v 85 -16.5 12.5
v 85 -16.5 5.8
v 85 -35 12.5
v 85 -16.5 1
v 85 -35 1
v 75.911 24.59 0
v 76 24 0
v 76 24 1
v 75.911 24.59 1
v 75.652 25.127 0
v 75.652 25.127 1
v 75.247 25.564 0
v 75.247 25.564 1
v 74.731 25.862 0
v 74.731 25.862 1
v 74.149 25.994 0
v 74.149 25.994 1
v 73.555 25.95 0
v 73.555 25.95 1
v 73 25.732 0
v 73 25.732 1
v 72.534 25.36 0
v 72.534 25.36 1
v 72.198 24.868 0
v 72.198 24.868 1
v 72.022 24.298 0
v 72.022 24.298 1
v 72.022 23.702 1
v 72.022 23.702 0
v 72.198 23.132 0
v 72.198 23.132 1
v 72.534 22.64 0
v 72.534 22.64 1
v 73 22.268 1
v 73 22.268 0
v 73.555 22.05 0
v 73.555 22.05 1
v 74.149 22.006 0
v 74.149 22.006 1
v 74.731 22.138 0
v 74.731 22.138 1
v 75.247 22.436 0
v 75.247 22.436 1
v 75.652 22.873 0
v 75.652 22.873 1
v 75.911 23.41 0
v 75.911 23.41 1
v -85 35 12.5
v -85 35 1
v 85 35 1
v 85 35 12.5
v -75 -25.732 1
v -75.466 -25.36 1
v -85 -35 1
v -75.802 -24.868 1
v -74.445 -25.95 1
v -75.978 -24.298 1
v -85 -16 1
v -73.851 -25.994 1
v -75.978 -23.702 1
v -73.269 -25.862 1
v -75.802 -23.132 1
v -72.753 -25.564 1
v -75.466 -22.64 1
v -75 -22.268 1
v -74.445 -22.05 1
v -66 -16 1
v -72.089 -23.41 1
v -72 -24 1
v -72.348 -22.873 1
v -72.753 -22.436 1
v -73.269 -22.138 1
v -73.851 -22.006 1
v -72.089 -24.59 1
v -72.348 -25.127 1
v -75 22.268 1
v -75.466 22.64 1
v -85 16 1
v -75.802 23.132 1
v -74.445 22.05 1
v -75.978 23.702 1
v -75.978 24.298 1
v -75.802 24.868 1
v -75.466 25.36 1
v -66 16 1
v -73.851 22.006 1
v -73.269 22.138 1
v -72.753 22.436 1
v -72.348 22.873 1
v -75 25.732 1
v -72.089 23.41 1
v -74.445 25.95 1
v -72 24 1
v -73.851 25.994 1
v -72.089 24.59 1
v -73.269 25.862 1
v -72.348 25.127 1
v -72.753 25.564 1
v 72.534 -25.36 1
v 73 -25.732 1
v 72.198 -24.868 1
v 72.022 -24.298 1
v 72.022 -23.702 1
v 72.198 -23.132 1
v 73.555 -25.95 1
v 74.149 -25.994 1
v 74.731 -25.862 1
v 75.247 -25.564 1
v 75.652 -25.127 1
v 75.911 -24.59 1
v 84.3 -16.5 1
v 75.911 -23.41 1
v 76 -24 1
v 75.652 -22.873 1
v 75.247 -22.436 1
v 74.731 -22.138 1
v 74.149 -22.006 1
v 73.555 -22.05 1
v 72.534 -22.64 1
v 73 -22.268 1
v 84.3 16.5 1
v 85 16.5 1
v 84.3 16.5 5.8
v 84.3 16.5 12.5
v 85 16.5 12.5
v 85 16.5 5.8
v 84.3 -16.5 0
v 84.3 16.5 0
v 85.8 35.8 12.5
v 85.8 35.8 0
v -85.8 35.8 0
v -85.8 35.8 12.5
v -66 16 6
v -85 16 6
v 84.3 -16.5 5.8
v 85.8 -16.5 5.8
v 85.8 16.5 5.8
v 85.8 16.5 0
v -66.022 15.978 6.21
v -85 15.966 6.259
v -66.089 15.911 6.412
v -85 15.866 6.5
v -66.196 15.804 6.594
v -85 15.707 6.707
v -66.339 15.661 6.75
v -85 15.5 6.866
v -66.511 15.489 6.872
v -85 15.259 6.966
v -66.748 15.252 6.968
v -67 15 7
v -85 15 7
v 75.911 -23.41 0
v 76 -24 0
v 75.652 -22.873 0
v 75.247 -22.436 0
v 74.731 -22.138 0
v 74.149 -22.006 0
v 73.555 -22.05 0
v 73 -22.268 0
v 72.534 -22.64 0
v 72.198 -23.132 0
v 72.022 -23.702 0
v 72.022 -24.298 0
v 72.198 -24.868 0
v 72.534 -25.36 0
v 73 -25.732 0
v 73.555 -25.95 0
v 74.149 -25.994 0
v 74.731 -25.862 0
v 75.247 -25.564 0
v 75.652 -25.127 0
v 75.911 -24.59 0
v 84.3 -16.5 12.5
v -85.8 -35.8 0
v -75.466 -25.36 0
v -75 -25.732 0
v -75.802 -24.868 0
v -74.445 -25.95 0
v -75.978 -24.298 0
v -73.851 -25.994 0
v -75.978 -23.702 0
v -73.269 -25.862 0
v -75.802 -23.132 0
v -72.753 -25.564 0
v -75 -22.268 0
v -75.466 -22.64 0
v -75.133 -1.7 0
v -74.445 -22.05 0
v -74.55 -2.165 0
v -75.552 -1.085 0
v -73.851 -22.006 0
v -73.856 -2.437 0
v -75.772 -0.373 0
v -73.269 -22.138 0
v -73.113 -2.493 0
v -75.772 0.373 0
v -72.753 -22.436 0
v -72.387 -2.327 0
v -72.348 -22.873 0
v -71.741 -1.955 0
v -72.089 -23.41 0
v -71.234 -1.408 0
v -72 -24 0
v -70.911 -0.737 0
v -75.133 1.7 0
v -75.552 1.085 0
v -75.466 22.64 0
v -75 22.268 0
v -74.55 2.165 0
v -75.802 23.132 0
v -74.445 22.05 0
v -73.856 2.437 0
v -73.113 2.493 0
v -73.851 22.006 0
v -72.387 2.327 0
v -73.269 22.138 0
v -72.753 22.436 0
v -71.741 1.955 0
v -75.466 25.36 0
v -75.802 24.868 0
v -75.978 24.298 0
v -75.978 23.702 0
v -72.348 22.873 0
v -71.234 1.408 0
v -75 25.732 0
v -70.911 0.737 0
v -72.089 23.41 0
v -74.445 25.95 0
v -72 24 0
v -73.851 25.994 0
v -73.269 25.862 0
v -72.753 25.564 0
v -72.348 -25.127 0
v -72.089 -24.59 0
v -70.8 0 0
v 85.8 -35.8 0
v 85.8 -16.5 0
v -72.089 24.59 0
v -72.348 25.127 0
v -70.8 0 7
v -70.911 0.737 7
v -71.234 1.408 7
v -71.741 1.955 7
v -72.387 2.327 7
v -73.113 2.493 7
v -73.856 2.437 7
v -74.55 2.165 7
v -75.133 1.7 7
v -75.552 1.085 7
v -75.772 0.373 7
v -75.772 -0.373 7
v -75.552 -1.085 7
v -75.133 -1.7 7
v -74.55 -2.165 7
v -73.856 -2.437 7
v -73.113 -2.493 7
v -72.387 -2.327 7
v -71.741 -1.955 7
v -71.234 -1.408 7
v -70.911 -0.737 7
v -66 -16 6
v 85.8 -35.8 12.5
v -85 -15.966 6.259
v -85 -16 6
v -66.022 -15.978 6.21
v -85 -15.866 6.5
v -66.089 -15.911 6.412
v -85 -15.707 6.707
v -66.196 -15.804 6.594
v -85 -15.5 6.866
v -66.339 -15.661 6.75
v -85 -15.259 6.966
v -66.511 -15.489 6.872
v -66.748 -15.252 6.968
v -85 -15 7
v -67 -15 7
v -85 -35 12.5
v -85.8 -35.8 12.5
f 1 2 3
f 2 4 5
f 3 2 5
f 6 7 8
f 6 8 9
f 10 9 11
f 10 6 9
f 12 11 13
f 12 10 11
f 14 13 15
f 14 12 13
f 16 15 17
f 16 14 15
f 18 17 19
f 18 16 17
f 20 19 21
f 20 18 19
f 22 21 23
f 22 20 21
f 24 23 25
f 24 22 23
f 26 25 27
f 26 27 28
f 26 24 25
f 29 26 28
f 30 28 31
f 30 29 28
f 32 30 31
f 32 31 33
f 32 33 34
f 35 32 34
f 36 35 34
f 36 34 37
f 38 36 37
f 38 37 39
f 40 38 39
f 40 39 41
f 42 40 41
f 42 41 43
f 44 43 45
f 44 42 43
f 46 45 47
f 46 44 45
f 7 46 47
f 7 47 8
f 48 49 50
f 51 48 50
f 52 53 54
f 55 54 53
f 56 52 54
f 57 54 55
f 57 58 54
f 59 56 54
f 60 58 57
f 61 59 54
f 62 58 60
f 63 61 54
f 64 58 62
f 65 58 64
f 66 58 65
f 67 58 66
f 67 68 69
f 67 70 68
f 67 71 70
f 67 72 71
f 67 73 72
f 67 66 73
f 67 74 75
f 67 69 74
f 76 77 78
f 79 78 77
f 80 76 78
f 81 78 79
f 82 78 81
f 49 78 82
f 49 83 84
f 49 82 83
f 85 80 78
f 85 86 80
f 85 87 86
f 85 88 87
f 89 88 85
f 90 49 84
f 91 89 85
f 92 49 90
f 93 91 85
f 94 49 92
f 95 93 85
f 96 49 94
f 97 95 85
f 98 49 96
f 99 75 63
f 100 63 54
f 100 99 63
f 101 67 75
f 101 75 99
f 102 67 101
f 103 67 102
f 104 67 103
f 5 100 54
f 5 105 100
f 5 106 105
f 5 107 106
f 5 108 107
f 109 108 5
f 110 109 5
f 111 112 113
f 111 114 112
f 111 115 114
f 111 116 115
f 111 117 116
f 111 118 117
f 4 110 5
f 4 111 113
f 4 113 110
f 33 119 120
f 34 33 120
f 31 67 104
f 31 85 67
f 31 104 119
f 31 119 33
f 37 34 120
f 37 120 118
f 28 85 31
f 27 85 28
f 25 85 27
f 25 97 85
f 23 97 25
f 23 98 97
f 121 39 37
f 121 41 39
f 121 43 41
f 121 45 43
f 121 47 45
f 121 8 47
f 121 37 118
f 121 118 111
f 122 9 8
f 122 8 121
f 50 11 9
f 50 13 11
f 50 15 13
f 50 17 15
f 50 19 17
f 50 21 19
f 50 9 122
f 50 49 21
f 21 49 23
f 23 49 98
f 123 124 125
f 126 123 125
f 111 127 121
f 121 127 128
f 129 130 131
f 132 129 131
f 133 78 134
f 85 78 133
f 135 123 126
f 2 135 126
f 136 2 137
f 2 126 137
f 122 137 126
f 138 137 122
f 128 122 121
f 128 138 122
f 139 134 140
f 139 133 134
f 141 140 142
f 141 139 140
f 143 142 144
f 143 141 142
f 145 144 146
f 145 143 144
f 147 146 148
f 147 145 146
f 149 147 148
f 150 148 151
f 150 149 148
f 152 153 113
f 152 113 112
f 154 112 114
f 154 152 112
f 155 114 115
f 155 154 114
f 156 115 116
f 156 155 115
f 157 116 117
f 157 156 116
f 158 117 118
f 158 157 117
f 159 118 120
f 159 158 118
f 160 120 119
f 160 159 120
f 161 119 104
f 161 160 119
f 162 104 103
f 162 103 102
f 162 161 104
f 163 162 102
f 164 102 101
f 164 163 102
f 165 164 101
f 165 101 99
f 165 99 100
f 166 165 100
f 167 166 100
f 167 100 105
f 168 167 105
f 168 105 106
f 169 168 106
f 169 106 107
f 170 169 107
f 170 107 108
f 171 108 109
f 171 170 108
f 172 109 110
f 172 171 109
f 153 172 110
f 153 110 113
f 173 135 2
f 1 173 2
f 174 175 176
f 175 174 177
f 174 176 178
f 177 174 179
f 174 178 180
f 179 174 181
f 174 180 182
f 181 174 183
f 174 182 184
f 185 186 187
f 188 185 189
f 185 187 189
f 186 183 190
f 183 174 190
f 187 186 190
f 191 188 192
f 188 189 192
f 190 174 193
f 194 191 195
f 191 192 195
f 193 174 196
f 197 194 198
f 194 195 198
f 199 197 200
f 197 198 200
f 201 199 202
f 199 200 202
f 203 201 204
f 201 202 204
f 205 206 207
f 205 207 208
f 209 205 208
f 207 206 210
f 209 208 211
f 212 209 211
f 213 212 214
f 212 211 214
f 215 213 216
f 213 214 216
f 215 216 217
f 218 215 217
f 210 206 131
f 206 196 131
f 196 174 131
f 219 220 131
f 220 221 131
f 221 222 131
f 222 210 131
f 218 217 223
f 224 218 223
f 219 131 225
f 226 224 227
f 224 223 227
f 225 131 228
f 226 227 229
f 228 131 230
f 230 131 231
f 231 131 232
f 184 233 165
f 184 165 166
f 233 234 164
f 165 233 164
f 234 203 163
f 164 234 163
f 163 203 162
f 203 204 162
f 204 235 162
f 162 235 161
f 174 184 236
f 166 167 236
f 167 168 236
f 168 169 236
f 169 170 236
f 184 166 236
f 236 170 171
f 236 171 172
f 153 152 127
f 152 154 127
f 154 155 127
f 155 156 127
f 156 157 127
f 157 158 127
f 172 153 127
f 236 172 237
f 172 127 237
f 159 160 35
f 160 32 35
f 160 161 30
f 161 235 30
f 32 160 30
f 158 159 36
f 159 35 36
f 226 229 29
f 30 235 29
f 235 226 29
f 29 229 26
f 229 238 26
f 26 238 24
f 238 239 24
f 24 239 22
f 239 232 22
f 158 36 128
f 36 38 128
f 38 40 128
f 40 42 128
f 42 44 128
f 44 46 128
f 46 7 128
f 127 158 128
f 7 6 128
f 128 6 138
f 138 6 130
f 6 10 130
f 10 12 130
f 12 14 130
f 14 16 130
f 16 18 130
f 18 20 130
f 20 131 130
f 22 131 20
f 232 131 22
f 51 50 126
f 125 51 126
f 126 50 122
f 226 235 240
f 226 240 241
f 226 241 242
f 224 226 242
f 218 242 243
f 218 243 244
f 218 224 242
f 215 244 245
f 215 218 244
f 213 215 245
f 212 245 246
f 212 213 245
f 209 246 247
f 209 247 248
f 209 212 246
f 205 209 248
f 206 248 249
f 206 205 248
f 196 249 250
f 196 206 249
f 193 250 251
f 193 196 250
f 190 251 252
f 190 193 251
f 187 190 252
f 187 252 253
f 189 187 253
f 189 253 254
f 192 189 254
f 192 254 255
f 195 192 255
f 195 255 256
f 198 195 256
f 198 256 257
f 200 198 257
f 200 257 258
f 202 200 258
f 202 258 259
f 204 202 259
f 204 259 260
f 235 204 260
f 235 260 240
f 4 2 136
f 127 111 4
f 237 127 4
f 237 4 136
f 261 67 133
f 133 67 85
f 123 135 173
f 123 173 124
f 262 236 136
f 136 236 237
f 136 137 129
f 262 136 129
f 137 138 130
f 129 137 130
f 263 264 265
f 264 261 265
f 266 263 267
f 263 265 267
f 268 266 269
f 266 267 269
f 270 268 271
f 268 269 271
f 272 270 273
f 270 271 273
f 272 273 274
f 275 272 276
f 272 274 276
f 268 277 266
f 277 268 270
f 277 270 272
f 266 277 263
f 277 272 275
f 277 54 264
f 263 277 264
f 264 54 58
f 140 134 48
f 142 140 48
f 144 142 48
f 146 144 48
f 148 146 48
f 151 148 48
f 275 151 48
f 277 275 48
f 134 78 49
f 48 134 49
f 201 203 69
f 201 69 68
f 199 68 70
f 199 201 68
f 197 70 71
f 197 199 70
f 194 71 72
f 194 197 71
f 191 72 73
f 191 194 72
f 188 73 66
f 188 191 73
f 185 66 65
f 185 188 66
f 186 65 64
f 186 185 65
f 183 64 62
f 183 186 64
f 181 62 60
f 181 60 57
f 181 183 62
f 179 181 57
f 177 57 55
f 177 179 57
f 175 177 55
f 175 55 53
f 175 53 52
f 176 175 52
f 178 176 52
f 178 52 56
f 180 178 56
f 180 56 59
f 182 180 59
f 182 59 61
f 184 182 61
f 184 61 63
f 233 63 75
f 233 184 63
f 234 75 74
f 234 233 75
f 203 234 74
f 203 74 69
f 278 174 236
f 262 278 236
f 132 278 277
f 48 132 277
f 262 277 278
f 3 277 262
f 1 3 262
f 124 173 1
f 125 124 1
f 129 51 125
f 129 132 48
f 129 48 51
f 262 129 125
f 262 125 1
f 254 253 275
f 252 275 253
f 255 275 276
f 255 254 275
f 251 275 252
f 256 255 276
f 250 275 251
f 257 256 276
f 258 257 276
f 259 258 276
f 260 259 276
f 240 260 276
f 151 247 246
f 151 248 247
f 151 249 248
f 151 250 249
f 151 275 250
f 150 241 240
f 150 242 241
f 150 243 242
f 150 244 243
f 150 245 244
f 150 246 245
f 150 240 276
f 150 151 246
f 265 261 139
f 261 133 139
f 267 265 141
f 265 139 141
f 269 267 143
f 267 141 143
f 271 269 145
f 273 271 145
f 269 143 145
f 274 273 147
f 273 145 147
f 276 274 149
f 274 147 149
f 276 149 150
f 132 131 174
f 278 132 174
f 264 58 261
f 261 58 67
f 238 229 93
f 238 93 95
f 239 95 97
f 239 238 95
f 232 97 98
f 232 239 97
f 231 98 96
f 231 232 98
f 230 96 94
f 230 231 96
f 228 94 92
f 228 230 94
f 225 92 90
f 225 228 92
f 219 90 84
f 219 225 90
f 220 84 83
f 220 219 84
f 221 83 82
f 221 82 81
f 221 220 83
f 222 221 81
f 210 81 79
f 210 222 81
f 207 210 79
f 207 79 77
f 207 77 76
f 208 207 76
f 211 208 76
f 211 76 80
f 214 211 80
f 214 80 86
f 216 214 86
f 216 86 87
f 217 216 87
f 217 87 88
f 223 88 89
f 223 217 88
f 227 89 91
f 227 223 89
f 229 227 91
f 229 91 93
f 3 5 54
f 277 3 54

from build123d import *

# Parameters (mm, degrees)
F0_R     = 2
F0_W     = 19
F0_H     = 32
F0_R_2   = 2.5
F1_DEPTH = 1
F2_DEPTH = 7
F0_W_2   = 0.8
F0_H_2   = 33
F0_W_3   = 0.7
F3_DEPTH = 12.5
F4_DEPTH = 5.8
F5_R     = 1


with BuildPart() as f1:
    # F0 (on Top) → F1 (new body)
    with BuildSketch(Plane.XY):
        Polygon((85, 35), (-85, 35), (-85, 16), (-66, 16), (-66, -16), (-85, -16), (-85, -35), (85, -35), (85, -16.5), (84.3, -16.5), (84.3, 16.5), (85, 16.5), align=None)
        with Locations((-74, -24)):
            Circle(F0_R, mode=Mode.SUBTRACT)
        with Locations((74, -24)):
            Circle(F0_R, mode=Mode.SUBTRACT)
        with Locations((-74, 24)):
            Circle(F0_R, mode=Mode.SUBTRACT)
        with Locations((74, 24)):
            Circle(F0_R, mode=Mode.SUBTRACT)
        with Locations((-75.5, 0)):
            Rectangle(F0_W, F0_H)
        with Locations((-73.3, 0)):
            Circle(F0_R_2, mode=Mode.SUBTRACT)
    extrude(amount=F1_DEPTH)

    # F0 (on Top) → F2 (join)
    with BuildSketch(Plane.XY):
        with Locations((-75.5, 0)):
            Rectangle(F0_W, F0_H)
        with Locations((-73.3, 0)):
            Circle(F0_R_2, mode=Mode.SUBTRACT)
    extrude(amount=F2_DEPTH)

    # F0 (on Top) → F3 (join)
    with BuildSketch(Plane.XY):
        Polygon((-85, 16), (-85, 35), (85, 35), (85, 16.5), (85.8, 16.5), (85.8, 35.8), (-85.8, 35.8), (-85.8, -35.8), (85.8, -35.8), (85.8, -16.5), (85, -16.5), (85, -35), (-85, -35), (-85, -16), align=None)
        with Locations((85.4, 0)):
            Rectangle(F0_W_2, F0_H_2)
        with Locations((84.65, 0)):
            Rectangle(F0_W_3, F0_H_2)
    extrude(amount=F3_DEPTH)

    # F0 (on Top) → F4 (cut)
    with BuildSketch(Plane.XY):
        with Locations((85.4, 0)):
            Rectangle(F0_W_2, F0_H_2)
        with Locations((84.65, 0)):
            Rectangle(F0_W_3, F0_H_2)
    extrude(amount=F4_DEPTH, mode=Mode.SUBTRACT)

    # F5
    f5_edges = [f1.edges().sort_by_distance(p)[0] for p in [
        (-75.5, -16, 7),
        (-75.5, 16, 7),
        (-66, 0, 7),
    ]]
    fillet(f5_edges, radius=F5_R)


solid = f1.part
